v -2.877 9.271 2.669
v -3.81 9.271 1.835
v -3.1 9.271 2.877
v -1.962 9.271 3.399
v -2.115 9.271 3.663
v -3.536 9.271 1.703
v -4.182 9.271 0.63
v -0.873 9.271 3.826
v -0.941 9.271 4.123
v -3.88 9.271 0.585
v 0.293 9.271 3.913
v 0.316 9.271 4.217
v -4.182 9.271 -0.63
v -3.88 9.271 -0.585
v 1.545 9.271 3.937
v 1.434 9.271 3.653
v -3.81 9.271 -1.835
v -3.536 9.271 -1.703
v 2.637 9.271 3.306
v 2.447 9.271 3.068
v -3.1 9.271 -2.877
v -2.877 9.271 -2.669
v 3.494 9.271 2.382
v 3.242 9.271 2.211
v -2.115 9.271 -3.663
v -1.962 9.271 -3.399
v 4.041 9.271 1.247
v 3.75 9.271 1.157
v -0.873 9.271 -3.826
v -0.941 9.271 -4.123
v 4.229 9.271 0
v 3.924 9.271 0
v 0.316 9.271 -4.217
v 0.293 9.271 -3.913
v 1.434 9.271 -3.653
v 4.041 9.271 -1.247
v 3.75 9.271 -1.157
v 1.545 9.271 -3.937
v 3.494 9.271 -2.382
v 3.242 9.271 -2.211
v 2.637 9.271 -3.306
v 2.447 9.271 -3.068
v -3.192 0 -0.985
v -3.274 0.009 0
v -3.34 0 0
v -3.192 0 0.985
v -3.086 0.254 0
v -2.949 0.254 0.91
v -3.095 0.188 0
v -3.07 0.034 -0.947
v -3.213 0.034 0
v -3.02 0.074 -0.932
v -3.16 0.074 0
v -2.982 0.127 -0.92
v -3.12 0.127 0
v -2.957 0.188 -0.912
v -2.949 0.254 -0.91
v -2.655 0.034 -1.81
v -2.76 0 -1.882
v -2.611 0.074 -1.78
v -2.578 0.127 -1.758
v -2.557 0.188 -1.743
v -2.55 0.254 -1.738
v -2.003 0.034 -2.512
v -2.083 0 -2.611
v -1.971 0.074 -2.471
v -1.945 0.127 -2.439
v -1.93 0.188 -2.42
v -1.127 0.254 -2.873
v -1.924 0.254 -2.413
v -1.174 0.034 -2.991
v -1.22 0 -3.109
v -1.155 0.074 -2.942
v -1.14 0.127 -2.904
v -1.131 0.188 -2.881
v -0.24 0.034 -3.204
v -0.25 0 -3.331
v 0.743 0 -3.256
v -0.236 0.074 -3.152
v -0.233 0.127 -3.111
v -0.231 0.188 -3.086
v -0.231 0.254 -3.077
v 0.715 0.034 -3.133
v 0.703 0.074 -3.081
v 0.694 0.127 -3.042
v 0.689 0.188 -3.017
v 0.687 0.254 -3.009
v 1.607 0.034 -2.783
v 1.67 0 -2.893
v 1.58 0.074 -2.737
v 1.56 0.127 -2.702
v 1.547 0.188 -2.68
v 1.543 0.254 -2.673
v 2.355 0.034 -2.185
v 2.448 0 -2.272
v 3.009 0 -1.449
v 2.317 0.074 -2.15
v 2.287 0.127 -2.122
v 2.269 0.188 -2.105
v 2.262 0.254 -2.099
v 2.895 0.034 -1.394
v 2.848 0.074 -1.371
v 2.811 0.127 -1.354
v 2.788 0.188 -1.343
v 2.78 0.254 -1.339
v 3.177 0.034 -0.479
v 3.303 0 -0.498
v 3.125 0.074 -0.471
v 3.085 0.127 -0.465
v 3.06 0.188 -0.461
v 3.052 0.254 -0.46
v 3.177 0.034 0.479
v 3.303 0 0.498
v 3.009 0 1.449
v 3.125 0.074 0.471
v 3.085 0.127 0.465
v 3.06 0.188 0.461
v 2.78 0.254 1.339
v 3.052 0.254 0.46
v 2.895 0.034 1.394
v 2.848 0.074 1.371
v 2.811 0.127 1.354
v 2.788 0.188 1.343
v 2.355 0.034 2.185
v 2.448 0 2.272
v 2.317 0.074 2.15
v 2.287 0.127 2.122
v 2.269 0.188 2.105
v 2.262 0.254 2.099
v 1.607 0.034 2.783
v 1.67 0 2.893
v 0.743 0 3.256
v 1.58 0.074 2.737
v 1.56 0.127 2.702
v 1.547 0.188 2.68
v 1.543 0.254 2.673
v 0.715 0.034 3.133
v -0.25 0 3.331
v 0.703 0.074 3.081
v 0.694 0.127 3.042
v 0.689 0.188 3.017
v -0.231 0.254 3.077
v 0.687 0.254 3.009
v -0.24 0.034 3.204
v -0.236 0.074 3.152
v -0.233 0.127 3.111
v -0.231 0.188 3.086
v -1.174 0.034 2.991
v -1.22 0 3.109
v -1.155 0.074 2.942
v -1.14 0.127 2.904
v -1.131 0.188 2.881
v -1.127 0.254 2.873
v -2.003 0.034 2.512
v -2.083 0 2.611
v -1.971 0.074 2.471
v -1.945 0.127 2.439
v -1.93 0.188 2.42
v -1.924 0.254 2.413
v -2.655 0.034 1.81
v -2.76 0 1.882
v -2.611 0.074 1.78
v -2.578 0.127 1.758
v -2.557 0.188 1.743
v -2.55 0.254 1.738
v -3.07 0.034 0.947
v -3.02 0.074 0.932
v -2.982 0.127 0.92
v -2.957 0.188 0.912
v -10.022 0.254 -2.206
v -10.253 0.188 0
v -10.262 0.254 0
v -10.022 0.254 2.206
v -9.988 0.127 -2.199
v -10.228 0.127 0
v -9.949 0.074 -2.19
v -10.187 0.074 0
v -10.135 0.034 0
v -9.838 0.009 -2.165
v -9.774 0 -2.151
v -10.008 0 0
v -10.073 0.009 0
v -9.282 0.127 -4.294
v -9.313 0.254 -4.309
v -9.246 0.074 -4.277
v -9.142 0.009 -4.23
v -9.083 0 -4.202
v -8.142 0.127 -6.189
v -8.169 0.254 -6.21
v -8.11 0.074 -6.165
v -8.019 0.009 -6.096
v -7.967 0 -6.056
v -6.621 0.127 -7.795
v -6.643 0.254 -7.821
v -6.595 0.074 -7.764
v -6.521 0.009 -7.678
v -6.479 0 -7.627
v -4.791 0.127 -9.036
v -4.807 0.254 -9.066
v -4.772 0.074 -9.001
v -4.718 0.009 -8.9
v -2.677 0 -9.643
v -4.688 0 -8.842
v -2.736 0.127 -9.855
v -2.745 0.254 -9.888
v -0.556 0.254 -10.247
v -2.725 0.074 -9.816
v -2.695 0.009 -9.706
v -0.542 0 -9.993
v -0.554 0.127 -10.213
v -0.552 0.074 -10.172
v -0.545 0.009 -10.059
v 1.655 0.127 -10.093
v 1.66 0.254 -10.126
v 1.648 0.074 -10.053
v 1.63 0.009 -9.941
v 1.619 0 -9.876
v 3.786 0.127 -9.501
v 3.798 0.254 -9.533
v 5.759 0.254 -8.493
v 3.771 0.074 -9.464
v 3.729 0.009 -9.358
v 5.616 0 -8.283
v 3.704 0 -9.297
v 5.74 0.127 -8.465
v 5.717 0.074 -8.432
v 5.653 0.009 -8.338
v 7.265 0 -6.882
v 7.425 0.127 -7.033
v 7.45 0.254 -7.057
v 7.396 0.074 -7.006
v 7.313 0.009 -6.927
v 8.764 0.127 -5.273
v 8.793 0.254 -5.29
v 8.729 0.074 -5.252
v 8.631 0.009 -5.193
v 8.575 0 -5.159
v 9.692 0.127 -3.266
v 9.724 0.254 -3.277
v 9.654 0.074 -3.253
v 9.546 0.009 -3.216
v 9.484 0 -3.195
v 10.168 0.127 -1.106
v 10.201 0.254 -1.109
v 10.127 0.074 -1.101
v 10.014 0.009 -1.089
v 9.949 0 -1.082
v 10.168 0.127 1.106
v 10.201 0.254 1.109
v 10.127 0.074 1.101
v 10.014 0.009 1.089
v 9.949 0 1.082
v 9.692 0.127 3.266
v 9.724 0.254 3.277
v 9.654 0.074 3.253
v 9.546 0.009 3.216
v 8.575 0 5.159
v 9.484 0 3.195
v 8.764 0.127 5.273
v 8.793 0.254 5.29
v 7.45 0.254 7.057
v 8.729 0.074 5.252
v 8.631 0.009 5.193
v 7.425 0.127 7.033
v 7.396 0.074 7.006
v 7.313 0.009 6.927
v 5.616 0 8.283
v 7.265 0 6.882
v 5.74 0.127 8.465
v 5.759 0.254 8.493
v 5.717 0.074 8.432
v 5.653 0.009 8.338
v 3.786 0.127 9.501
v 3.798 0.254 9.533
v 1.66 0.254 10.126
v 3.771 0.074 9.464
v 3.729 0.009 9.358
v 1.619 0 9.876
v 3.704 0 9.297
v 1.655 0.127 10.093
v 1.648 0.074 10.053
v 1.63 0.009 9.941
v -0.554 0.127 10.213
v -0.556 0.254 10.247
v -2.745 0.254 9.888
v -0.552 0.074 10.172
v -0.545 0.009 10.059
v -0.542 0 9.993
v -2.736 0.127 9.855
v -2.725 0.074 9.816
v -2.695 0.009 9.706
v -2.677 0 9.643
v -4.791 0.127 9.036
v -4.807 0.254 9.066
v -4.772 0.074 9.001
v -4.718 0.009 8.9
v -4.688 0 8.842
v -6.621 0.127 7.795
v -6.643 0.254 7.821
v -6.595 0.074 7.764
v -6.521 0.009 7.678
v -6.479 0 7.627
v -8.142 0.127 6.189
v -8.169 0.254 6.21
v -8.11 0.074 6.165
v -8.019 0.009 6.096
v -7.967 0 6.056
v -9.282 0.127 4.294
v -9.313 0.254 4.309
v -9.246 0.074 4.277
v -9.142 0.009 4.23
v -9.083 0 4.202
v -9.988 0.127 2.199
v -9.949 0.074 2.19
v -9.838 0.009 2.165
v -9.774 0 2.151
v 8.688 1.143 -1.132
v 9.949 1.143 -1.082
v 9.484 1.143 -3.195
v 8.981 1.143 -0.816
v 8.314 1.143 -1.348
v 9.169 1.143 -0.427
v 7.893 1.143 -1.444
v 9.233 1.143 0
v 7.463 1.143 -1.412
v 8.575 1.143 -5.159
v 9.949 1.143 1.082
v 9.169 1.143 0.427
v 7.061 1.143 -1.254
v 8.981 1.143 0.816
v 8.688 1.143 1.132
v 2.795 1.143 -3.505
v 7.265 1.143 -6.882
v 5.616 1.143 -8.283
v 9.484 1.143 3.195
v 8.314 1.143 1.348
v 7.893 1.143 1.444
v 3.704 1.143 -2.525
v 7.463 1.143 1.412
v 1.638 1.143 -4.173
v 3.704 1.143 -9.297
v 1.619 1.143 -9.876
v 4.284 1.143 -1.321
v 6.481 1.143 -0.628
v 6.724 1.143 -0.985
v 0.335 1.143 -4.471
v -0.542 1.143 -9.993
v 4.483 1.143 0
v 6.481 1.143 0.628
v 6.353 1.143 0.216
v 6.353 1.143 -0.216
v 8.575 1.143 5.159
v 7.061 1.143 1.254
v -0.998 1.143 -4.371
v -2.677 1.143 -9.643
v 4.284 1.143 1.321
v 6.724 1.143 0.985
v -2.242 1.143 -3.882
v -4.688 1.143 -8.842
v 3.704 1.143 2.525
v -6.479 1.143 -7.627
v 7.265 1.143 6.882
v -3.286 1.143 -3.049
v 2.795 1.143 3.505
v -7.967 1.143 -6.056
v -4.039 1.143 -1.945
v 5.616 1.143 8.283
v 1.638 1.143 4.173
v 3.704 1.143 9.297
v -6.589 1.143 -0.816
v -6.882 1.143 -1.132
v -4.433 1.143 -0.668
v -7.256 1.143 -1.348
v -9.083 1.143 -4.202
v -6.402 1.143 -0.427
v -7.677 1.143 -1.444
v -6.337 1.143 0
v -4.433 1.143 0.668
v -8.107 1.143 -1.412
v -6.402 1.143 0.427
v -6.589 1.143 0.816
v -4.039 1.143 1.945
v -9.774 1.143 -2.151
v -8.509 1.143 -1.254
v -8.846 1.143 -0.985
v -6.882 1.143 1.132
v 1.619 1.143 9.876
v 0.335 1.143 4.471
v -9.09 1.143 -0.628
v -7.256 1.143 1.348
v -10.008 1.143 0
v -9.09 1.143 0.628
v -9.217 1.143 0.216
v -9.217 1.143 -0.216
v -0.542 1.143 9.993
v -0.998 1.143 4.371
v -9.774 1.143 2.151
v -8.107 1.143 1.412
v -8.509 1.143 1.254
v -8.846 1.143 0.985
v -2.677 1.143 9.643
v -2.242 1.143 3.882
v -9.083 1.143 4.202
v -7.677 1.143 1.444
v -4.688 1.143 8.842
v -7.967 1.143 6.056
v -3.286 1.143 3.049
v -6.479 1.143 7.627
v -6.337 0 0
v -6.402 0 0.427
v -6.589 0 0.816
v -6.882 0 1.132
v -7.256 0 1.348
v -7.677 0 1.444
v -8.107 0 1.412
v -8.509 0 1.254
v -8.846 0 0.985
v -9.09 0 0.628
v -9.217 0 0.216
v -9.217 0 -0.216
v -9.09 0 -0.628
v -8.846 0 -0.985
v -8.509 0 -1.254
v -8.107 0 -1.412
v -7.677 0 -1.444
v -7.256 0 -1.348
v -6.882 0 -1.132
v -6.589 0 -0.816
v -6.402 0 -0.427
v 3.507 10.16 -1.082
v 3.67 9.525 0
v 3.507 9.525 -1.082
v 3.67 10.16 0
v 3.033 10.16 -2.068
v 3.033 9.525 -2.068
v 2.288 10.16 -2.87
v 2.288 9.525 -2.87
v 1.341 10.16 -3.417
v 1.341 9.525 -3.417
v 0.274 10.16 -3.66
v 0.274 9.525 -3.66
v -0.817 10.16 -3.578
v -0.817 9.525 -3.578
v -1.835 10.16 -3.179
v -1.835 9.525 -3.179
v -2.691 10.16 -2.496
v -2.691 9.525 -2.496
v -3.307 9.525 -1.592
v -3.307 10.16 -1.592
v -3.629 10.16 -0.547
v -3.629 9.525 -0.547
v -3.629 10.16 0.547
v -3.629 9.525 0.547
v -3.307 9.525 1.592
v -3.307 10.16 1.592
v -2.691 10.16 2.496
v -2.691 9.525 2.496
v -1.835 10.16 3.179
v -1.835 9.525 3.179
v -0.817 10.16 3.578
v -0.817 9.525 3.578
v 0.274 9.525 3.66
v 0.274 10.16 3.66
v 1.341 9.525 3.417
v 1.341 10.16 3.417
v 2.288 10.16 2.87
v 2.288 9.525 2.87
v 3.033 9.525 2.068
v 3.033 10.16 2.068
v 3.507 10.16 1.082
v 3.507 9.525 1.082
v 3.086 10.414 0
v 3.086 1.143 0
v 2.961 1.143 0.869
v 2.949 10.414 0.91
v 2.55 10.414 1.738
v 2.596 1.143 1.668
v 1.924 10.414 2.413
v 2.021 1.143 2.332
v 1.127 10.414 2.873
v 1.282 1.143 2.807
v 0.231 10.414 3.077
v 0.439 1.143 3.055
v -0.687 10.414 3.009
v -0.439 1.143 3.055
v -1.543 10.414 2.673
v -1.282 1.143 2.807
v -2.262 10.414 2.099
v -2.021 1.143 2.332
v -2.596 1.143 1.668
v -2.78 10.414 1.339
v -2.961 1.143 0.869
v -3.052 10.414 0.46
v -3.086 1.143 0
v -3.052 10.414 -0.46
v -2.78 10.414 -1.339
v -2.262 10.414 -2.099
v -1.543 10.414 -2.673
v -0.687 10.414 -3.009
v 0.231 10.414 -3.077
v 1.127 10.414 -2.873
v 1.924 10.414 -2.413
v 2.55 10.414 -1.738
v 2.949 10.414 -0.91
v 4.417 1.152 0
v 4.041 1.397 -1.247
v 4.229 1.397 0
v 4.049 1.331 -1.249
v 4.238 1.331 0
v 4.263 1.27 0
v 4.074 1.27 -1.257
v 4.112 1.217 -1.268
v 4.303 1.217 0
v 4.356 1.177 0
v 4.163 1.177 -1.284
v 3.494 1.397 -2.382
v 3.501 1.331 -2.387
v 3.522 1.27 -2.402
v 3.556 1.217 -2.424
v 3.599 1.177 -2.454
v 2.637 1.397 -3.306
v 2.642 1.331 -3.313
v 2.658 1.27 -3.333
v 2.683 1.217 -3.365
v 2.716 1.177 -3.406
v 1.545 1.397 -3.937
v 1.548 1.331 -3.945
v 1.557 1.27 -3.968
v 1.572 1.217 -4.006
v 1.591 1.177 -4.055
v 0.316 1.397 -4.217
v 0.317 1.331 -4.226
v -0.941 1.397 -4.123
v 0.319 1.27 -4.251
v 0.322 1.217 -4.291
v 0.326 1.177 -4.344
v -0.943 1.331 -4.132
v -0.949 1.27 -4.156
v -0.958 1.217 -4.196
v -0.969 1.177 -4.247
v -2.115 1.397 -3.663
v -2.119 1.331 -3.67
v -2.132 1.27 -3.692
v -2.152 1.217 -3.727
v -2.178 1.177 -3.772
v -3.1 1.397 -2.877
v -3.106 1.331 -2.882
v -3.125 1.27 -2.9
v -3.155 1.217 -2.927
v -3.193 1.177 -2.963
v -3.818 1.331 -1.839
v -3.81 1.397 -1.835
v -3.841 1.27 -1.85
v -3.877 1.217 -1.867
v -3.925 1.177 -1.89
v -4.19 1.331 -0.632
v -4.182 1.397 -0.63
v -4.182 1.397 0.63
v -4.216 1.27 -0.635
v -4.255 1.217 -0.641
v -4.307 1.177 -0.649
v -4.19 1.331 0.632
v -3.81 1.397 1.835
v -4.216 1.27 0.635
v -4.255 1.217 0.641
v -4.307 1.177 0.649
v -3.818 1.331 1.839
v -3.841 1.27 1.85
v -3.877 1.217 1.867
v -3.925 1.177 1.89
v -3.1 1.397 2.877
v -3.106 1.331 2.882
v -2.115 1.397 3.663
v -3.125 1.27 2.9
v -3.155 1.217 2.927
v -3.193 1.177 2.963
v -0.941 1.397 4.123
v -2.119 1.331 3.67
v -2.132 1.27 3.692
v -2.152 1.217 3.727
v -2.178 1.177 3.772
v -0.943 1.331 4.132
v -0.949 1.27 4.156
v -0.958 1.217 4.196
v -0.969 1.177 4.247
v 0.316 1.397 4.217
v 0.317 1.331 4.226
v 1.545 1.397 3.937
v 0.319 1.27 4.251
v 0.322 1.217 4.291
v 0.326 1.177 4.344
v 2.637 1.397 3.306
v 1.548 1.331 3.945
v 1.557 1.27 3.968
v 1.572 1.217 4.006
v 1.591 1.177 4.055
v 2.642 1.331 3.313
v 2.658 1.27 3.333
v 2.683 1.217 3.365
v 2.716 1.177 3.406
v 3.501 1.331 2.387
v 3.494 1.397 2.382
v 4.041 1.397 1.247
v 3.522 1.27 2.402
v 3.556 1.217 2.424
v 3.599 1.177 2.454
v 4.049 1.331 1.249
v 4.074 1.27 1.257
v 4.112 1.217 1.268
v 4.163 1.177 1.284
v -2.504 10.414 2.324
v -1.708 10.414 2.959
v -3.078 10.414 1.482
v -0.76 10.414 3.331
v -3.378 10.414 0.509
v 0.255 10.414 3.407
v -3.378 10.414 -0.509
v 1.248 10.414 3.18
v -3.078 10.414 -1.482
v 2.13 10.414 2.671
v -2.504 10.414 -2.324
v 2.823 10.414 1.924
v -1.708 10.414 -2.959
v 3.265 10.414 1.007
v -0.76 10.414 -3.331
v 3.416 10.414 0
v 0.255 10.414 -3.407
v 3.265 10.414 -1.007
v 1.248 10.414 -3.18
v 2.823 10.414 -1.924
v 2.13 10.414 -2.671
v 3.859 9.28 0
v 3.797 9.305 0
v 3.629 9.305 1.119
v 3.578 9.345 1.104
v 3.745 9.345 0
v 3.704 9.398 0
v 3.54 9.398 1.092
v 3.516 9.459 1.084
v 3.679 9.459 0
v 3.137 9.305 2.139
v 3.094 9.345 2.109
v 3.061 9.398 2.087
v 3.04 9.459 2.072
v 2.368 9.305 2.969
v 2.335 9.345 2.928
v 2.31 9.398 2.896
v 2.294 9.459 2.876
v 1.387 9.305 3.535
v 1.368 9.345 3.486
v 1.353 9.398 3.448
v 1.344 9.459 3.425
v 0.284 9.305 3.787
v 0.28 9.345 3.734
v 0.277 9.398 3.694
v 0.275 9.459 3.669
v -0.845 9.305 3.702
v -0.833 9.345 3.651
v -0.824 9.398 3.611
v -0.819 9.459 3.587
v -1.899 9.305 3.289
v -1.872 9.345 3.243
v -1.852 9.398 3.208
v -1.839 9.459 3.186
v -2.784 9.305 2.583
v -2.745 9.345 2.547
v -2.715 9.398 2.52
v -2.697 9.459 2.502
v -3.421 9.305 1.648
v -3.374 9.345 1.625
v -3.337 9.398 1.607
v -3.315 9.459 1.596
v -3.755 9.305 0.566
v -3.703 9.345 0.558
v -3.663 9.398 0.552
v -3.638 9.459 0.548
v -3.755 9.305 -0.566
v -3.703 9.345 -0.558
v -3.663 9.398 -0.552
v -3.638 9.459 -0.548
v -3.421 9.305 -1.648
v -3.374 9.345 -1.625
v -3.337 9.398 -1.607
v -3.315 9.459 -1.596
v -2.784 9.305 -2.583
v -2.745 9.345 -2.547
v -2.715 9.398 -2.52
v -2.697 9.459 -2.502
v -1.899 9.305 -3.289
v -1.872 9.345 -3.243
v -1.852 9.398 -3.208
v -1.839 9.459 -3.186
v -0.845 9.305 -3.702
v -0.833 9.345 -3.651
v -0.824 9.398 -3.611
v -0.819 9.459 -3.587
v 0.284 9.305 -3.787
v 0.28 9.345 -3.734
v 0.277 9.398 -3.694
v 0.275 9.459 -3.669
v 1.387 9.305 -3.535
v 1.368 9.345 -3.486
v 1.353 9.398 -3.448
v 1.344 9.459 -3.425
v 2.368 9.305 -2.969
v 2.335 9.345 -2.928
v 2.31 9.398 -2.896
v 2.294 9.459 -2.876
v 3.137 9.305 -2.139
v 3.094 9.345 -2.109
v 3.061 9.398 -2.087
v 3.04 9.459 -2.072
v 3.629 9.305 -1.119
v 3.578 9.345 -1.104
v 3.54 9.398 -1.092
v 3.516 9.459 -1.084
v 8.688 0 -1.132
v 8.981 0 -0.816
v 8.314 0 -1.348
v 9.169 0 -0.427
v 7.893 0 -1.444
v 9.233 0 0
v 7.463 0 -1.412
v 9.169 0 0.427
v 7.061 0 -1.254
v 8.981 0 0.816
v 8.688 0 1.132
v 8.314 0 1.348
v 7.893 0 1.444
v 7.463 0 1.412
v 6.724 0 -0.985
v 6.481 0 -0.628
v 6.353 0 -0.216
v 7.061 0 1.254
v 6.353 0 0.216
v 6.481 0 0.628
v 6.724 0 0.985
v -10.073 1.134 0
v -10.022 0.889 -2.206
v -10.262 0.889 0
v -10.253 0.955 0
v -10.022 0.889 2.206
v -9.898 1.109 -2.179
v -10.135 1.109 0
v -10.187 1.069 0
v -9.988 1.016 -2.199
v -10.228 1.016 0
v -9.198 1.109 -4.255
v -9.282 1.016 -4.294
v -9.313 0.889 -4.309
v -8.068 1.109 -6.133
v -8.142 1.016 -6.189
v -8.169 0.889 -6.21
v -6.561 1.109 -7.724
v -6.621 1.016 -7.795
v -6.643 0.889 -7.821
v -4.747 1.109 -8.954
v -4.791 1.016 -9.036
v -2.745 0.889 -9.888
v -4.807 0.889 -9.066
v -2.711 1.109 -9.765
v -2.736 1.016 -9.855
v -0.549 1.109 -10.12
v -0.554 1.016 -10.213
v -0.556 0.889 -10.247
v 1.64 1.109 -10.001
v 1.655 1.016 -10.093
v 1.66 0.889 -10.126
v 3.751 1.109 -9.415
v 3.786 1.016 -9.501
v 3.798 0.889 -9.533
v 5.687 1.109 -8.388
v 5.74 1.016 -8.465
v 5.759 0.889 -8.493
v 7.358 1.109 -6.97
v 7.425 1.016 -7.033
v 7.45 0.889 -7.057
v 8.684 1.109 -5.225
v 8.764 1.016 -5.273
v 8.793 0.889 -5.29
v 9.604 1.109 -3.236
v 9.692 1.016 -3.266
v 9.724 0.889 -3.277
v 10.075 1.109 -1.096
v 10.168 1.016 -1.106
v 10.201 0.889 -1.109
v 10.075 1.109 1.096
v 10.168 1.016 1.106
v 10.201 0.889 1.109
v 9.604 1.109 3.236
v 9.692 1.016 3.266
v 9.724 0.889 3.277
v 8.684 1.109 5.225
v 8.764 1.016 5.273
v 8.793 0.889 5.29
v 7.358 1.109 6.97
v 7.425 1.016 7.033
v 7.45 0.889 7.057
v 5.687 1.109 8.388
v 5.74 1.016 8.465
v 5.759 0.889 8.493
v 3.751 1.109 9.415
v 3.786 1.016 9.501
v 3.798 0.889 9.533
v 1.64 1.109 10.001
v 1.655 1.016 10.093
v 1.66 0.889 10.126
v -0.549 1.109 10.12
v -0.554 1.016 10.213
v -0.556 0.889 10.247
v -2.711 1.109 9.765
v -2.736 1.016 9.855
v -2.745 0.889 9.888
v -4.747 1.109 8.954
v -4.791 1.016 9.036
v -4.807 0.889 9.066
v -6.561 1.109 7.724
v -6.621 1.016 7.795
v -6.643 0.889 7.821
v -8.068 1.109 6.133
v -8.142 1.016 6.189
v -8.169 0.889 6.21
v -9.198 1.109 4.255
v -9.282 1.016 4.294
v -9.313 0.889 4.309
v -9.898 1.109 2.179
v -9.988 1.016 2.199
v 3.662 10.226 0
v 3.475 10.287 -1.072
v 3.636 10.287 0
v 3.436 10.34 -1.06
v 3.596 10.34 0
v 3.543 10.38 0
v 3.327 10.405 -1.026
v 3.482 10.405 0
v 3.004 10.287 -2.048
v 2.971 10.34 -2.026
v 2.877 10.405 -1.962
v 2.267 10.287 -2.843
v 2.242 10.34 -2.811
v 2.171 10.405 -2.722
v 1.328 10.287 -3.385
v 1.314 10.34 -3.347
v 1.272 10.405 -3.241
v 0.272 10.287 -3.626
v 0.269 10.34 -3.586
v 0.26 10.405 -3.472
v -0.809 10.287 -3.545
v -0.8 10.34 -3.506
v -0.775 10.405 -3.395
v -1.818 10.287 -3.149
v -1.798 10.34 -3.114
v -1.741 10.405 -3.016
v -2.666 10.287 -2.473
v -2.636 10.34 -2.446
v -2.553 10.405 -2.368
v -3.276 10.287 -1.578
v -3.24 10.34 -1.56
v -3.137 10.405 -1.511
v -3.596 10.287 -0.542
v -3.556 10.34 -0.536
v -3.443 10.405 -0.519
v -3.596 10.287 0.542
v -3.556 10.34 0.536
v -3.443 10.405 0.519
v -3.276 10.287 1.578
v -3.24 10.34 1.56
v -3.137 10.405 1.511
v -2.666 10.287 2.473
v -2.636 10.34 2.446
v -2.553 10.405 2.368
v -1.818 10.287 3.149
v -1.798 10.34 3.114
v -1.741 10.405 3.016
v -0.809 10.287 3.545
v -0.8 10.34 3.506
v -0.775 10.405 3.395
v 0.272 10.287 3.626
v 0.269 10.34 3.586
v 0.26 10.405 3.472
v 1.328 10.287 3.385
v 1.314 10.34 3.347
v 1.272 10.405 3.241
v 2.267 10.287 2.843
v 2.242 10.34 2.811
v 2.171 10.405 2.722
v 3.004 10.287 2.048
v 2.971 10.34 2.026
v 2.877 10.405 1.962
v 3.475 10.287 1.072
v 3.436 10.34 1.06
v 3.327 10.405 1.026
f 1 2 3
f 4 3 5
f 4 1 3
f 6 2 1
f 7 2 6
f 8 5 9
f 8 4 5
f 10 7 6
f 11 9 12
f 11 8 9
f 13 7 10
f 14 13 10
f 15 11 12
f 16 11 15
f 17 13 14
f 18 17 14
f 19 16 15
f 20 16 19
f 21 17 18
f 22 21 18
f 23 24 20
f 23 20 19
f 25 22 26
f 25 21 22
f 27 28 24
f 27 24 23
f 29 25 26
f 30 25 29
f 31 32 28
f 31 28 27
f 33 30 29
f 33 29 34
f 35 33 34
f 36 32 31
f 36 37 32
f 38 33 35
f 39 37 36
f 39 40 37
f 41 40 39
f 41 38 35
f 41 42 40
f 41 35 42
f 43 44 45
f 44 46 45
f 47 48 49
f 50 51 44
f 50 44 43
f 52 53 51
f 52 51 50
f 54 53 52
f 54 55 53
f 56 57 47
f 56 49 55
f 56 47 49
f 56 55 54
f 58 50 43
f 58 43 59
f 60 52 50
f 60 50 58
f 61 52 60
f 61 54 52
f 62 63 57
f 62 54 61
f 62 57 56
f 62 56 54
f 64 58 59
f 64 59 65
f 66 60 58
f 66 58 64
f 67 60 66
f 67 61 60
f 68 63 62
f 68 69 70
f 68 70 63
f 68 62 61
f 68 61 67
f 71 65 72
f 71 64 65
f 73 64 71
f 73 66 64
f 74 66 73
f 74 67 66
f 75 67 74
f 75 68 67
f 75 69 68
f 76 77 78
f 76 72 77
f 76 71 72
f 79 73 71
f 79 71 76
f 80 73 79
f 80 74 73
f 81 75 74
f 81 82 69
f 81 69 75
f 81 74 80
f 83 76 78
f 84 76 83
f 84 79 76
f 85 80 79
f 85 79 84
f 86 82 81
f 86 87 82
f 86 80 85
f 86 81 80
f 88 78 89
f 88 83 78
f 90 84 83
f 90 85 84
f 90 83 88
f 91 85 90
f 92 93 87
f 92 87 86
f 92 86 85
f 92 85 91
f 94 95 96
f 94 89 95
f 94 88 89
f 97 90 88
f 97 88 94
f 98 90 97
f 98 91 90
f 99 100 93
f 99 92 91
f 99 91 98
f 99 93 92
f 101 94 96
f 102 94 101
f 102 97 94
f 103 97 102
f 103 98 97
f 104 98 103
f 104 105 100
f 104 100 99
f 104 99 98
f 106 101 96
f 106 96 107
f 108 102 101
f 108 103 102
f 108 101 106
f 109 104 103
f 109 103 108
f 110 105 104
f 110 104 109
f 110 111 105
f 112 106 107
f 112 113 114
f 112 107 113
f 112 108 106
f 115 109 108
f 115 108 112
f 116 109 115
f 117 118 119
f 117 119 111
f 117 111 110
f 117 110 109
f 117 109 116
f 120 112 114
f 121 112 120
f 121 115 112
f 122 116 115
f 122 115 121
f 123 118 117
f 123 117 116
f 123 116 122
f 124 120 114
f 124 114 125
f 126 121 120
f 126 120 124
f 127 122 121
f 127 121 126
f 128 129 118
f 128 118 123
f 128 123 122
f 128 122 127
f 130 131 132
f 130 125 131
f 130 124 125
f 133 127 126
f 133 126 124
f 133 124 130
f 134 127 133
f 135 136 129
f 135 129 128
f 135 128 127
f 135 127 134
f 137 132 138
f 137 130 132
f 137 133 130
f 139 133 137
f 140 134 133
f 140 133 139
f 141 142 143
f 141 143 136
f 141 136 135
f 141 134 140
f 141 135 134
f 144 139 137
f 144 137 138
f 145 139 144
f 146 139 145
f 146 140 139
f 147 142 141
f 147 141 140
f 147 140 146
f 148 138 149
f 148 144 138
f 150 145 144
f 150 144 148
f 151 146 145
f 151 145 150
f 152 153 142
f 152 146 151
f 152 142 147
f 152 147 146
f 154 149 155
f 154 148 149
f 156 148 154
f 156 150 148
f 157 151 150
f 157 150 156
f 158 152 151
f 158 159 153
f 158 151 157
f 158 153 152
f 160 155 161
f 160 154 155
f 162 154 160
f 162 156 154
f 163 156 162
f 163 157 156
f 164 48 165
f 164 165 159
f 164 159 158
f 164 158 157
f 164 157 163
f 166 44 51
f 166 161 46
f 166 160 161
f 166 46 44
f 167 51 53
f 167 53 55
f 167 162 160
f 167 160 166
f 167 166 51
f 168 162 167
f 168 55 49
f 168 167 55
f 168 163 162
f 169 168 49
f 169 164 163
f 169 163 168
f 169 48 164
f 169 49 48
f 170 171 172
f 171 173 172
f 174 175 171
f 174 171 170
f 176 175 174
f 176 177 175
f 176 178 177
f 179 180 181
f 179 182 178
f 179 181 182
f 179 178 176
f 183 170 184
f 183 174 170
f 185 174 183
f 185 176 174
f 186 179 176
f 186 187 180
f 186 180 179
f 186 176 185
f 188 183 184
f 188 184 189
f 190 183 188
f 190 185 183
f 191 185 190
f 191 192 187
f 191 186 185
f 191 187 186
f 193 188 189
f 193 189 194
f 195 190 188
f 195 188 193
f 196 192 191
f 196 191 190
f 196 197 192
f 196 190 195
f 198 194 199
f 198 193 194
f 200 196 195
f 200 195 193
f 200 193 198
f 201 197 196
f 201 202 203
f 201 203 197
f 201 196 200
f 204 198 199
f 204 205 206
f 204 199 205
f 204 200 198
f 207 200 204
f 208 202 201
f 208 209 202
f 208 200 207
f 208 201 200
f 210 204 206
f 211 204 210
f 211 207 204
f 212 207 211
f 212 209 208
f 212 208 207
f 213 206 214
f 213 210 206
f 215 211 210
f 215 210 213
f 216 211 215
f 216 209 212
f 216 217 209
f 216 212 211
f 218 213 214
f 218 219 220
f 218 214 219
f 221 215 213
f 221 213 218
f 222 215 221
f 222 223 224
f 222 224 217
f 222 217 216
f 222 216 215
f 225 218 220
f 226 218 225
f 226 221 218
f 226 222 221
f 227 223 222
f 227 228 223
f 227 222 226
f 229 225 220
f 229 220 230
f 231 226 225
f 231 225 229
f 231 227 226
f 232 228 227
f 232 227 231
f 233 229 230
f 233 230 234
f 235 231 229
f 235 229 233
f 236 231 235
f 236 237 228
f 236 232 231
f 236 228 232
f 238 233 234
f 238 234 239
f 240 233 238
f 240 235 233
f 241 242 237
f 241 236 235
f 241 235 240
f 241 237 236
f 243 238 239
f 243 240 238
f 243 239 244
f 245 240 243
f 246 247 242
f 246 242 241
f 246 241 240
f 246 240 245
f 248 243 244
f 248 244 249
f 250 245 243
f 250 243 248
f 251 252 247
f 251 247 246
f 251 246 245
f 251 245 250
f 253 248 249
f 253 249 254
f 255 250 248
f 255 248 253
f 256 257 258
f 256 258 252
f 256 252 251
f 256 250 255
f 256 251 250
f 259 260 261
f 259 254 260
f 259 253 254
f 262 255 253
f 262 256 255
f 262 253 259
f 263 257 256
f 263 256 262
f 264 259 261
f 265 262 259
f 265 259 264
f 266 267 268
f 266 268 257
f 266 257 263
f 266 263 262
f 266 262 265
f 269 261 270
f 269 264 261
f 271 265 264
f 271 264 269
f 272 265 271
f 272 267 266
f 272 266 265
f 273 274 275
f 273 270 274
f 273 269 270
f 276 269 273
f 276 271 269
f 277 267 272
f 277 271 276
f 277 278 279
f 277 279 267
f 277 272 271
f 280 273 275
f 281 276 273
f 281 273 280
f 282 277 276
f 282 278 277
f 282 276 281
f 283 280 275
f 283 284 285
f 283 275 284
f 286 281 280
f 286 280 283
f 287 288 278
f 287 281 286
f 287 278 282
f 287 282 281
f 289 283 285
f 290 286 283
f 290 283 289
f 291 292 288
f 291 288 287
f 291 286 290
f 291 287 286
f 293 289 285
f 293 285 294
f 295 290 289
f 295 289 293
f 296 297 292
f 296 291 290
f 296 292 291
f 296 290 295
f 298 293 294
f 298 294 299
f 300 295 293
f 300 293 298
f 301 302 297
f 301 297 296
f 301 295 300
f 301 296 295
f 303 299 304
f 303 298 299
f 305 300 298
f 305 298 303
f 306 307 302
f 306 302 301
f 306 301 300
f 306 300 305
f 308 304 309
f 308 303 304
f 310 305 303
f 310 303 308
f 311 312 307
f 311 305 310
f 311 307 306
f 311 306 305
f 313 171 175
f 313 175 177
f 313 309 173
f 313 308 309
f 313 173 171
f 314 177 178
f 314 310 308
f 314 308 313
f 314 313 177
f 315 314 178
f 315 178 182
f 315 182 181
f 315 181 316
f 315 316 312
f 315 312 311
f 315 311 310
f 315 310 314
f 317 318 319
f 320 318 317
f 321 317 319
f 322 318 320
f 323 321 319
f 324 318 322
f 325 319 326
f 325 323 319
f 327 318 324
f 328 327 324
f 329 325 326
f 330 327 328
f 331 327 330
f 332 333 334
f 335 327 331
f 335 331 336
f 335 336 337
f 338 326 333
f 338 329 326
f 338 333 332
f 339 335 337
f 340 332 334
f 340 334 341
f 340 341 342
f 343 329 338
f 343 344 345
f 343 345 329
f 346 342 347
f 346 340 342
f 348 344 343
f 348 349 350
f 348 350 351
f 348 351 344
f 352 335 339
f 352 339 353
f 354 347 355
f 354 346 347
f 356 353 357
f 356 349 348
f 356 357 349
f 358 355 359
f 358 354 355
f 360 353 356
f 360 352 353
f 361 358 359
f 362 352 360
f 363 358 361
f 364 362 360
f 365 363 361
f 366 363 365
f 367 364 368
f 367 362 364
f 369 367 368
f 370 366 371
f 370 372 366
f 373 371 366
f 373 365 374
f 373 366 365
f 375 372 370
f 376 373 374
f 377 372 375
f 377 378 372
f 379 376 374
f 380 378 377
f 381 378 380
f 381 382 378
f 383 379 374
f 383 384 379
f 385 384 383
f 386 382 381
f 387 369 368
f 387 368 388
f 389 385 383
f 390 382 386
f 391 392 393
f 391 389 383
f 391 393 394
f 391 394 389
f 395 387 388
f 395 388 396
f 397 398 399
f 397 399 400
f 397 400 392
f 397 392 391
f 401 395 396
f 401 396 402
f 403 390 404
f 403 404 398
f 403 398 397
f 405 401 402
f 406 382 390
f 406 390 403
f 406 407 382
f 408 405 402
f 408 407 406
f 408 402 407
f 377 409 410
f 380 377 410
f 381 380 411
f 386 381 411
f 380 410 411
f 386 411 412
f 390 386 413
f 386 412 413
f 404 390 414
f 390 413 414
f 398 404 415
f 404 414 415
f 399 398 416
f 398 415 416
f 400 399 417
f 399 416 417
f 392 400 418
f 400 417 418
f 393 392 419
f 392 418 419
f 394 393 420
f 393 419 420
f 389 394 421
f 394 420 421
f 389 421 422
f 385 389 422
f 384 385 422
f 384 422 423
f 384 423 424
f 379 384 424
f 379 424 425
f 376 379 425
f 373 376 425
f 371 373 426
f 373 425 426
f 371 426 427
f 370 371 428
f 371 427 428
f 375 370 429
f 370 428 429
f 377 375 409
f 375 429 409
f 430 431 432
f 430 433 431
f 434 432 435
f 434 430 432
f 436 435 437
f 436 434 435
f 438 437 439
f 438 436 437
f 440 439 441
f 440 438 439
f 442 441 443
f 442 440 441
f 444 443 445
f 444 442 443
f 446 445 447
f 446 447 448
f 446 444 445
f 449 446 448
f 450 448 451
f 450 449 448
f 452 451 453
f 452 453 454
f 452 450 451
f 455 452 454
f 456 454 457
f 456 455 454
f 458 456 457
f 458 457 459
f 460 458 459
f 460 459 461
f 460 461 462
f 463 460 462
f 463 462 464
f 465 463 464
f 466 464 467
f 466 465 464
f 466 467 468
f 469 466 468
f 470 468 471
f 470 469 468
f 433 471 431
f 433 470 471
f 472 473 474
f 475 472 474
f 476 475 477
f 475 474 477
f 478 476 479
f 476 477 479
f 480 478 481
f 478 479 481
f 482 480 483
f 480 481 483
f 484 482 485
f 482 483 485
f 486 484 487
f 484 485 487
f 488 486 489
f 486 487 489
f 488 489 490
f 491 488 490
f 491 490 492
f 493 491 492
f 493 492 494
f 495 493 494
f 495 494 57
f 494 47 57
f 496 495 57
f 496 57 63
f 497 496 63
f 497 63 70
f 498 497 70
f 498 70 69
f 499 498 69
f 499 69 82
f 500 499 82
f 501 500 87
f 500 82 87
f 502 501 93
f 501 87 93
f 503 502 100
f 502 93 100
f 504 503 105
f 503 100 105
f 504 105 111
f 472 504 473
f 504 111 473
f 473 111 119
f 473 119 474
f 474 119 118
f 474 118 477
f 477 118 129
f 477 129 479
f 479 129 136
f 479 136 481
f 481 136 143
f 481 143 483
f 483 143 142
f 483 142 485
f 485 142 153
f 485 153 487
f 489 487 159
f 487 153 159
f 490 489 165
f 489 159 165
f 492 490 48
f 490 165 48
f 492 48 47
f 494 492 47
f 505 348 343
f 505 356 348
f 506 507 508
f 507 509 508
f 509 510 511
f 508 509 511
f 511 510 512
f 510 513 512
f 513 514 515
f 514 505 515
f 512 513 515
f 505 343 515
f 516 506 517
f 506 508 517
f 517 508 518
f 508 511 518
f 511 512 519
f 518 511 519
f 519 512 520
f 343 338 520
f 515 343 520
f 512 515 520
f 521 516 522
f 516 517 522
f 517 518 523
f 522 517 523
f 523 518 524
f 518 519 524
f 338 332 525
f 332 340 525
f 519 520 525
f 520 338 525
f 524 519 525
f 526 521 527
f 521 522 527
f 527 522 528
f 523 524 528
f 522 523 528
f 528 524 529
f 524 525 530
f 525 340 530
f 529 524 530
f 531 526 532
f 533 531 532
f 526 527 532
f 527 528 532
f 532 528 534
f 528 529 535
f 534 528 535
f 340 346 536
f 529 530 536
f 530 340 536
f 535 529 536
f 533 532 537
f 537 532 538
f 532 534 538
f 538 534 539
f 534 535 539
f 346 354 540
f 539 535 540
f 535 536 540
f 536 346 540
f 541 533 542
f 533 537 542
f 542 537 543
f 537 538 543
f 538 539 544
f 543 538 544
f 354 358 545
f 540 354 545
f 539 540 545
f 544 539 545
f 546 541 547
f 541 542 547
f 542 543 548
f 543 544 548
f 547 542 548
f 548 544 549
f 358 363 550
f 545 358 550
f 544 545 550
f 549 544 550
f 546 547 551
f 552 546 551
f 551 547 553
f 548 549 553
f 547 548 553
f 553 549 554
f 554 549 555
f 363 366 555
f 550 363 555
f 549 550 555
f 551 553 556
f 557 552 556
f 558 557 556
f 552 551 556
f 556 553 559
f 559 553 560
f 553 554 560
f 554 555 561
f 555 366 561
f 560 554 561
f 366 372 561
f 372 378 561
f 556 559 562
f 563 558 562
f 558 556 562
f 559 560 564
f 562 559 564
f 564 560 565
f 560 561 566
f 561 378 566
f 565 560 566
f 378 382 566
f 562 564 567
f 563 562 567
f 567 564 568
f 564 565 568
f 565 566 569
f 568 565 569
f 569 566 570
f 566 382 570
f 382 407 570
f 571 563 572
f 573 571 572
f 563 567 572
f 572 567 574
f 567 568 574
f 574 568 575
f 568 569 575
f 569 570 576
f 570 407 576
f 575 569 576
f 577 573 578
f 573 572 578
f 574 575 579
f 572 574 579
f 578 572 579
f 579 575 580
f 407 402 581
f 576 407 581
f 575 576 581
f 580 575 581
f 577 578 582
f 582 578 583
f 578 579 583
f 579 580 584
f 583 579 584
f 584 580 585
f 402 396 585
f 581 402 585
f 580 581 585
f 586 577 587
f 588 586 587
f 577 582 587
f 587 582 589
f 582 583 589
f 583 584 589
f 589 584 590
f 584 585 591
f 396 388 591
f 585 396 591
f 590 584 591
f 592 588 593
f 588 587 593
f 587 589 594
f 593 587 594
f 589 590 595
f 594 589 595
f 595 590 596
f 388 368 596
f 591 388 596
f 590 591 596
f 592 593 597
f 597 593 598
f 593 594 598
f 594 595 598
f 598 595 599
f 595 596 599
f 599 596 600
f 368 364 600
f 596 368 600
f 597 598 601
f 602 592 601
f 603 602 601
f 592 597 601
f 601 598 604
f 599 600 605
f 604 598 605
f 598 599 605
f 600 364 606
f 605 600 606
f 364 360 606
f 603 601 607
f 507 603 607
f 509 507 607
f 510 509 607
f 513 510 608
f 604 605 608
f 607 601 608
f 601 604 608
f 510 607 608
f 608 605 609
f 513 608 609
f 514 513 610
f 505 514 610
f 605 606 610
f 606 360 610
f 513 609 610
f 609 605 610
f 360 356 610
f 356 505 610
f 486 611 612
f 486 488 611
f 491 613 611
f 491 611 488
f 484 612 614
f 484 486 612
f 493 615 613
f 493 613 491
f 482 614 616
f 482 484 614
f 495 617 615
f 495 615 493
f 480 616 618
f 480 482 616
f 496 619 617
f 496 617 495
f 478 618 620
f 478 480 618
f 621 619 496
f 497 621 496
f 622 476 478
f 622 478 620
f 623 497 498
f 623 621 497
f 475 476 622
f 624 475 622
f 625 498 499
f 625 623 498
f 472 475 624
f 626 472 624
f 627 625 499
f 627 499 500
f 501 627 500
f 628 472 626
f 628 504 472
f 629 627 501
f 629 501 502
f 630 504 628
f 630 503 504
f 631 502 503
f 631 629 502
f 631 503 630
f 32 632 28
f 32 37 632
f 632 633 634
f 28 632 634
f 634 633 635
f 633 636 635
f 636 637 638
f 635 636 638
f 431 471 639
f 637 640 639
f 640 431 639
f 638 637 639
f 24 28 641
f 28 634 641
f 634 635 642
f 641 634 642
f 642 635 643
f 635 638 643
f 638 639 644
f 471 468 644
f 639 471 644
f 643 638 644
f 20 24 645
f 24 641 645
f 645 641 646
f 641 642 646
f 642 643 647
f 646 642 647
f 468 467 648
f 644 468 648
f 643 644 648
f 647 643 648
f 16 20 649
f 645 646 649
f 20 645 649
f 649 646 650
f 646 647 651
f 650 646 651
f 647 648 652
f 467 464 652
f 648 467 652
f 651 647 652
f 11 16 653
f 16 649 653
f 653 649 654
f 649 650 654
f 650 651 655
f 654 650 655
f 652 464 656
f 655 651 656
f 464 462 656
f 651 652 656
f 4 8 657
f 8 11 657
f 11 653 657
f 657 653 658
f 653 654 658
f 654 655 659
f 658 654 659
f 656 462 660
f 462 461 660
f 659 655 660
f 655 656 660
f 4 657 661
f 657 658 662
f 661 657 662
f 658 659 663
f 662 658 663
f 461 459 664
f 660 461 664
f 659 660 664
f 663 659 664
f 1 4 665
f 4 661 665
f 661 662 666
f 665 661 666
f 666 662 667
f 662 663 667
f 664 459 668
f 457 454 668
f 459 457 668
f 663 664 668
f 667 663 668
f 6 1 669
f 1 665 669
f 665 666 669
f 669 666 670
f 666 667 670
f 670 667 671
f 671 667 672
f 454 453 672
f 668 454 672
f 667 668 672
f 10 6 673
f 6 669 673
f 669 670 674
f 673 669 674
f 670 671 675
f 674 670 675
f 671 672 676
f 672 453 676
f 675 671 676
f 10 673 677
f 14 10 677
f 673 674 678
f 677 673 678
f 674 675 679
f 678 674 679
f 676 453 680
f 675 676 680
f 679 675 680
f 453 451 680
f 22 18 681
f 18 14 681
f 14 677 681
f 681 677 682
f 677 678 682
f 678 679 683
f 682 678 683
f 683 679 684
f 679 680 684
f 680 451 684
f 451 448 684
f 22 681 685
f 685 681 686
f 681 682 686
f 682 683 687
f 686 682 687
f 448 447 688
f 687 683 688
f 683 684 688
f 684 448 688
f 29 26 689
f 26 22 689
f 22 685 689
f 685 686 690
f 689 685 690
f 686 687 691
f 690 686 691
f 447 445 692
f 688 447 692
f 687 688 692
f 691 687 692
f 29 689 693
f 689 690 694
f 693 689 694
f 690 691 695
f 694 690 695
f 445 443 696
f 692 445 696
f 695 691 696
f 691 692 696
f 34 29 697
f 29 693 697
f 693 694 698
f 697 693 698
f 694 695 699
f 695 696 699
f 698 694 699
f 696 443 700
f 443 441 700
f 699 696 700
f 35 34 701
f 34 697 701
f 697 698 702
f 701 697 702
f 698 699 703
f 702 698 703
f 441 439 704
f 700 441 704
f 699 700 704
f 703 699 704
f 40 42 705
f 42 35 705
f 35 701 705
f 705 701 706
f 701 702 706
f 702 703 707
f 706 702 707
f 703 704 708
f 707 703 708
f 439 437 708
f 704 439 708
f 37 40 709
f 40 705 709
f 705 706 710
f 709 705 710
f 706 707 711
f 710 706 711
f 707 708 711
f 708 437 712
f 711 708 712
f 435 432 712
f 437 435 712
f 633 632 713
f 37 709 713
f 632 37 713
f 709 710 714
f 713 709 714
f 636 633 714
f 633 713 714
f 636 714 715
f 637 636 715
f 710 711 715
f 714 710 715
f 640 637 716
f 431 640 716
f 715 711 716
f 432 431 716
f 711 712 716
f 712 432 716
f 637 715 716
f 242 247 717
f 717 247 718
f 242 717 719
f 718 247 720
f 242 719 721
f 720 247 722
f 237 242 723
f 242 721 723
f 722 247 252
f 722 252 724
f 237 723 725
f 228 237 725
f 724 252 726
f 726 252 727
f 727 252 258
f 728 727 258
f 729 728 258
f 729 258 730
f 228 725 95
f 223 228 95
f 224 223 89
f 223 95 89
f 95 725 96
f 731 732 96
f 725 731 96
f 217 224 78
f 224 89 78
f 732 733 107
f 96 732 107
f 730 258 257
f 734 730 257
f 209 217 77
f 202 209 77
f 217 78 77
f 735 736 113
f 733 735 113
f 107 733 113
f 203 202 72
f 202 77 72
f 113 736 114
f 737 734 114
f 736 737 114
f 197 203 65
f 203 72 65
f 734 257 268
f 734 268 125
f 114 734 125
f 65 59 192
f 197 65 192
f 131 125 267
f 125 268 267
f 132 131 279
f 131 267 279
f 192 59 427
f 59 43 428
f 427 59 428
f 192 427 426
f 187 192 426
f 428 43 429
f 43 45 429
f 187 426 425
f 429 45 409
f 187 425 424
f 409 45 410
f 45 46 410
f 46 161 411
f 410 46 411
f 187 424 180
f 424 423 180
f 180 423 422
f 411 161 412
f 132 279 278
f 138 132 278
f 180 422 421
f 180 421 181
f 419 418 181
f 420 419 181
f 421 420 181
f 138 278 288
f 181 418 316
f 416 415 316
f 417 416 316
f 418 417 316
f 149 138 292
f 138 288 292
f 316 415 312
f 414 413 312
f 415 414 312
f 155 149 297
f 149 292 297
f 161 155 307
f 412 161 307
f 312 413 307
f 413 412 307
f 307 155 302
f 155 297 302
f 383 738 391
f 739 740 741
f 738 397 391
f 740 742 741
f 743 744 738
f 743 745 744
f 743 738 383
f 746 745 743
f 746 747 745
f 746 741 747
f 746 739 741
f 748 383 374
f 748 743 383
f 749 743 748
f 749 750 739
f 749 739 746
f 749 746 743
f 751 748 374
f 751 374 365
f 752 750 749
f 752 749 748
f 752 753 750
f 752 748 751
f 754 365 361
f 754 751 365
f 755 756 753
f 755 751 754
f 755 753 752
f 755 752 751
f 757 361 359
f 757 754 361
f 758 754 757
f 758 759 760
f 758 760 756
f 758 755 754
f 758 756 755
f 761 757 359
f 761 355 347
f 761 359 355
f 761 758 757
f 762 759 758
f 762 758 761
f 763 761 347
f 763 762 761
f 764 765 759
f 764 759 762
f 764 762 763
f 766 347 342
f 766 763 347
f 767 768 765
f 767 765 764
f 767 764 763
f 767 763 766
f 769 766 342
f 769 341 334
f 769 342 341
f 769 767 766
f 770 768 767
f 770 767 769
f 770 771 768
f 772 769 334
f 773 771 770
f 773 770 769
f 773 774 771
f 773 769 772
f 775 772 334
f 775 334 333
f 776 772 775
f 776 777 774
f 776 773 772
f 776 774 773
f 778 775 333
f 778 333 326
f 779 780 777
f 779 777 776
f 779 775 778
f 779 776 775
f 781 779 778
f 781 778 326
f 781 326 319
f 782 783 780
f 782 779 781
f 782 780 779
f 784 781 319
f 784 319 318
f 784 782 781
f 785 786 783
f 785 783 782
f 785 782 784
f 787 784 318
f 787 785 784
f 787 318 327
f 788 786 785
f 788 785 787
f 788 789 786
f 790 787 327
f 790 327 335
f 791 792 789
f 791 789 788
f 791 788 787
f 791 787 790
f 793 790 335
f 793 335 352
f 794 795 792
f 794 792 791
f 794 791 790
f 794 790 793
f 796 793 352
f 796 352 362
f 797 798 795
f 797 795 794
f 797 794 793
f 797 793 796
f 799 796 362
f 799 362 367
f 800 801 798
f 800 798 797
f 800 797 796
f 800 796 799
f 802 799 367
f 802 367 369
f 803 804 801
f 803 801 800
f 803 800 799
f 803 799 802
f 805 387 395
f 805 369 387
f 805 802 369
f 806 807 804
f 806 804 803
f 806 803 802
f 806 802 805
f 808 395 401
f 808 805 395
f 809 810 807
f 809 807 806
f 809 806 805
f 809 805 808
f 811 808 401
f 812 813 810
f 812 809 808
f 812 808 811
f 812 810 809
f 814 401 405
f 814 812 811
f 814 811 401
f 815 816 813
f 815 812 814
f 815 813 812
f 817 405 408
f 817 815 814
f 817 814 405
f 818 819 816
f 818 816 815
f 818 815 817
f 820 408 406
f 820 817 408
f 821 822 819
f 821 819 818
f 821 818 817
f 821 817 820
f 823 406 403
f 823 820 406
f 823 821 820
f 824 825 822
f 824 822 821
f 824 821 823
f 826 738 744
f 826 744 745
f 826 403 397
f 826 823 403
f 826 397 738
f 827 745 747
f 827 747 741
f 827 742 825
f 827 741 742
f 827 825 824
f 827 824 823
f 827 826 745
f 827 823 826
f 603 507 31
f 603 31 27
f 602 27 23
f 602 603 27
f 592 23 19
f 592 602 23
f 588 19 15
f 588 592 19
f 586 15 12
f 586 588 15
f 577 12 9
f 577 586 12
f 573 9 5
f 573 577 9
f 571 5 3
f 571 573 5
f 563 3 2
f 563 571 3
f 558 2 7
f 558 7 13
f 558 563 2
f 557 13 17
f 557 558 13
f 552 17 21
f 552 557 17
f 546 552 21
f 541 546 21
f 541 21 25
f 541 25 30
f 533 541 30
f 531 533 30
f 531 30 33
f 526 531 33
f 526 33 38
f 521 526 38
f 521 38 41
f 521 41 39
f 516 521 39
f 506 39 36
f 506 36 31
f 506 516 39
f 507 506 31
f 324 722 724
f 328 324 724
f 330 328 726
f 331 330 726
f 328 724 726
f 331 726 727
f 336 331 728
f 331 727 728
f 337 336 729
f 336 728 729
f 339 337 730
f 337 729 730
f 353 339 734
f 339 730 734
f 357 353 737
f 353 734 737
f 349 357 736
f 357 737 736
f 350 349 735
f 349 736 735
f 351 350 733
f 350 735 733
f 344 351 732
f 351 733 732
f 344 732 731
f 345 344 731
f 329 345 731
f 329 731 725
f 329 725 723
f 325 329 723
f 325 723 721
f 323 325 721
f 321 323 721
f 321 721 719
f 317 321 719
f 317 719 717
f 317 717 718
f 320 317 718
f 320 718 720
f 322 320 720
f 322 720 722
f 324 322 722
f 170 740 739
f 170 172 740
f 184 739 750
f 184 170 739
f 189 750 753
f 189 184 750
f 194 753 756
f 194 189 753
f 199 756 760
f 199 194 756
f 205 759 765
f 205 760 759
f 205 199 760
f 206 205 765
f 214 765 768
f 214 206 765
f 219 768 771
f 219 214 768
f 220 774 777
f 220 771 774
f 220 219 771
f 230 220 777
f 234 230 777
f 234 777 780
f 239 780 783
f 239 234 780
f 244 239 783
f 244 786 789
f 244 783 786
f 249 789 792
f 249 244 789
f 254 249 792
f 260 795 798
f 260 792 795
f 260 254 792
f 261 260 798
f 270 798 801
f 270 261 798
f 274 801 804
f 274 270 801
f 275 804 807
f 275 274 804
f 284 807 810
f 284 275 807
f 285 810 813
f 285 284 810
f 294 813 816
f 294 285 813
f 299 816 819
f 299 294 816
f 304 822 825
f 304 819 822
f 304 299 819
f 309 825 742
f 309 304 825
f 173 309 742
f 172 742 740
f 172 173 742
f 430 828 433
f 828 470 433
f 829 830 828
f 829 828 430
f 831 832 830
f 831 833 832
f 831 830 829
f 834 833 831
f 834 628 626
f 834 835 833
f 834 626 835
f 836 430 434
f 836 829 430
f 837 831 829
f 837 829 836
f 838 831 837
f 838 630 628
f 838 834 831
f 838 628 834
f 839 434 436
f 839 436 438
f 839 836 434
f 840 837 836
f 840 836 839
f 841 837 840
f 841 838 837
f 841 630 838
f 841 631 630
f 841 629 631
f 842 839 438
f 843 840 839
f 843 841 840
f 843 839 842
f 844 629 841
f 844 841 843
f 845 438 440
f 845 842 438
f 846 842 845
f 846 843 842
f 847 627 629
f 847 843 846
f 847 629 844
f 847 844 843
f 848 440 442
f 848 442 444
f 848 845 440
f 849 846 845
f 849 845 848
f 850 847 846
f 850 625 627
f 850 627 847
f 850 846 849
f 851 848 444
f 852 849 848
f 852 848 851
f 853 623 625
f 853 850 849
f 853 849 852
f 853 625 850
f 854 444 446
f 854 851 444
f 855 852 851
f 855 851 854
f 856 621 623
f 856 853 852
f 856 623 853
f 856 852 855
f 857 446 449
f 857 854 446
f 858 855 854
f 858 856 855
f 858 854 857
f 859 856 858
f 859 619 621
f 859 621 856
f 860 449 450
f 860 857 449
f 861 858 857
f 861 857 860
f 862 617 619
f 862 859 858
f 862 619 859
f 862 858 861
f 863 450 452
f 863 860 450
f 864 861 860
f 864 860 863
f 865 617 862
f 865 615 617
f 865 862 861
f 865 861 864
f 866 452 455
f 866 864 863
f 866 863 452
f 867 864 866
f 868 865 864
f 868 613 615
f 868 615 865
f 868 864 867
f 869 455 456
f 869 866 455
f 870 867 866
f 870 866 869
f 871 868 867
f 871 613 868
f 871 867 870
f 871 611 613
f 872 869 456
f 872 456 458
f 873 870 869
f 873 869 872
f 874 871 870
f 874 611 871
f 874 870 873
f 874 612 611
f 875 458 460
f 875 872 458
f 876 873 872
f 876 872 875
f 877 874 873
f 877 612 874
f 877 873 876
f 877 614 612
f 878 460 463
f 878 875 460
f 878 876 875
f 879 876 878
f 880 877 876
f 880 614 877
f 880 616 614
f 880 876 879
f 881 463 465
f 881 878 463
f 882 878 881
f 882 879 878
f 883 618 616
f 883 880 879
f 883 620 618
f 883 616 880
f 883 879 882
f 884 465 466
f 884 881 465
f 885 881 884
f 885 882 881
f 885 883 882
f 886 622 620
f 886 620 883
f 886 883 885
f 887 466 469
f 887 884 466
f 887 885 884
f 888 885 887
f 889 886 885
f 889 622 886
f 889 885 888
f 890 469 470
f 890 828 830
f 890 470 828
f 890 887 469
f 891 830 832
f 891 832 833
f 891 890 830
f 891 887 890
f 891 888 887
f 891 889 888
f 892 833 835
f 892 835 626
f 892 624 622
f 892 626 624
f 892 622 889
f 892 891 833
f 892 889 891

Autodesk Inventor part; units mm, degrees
ref_plane "YZ Plane" through (0, 0, 0) normal (1, 0, 0) x (0, 1, 0)
ref_plane "XZ Plane" through (0, 0, 0) normal (0, 1, 0) x (-1, 0, 0)
ref_plane "XY Plane" through (0, 0, 0) normal (0, 0, 1) x (1, 0, 0)
sketch "Sketch1" plane through (0, 0, 0) normal (0, 1, 0) x (-1, 0, 0)
  circle A0 centre (0, 0) radius 10.2616
  circle A1 centre (0, 0) radius 3.0861
  dimension "d0" = 20.5232
  dimension "d1" = 6.1722
extrude "Extrusion1" add sketch "Sketch1" along normal blind 1.143
sketch "Sketch3" plane through (0, 0, 0) normal (0, -1, 0) x (1, 0, 0)
  circle A0 centre (0, 0) radius 10.2616 construction
  line L0 (-10.2616, 0) -> (10.2616, 0) construction
  circle A1 centre (-7.7851, 0) radius 1.4478
  circle A2 centre (7.7851, 0) radius 1.4478
  dimension "d7" = 7.7851
  dimension "d8" = 2.8956
  dimension "d11" = 360
extrude "Extrusion3" cut sketch "Sketch3" against normal through all
sketch "Sketch2" plane through (0, 1.143, 0) normal (0, 1, 0) x (1, 0, 0)
  circle A0 centre (0, 0) radius 3.0861
  circle A1 centre (0, 0) radius 4.2291
  dimension "d4" = 8.4582
extrude "Extrusion2" add sketch "Sketch2" along normal blind 9.271
sketch "Sketch4" plane through (0, 10.414, 0) normal (0, 1, 0) x (1, 0, 0)
  circle A0 centre (0, 0) radius 4.3162
  circle A1 centre (0, 0) radius 3.6703
  dimension "d15" = 7.3406
extrude "Extrusion4" cut sketch "Sketch4" against normal blind 1.143
fillet "Fillet1" radius 0.254 6 edges at (10.2616, 0, 0) (3.0861, 0, 0) (10.2616, 1.143, 0) (-3.6703, 10.414, 0) (-3.6703, 9.271, 0) (-4.2291, 1.143, 0)
properties part number "Steele Sewing Machine Bobbin Base" material "ABS Plastic"
